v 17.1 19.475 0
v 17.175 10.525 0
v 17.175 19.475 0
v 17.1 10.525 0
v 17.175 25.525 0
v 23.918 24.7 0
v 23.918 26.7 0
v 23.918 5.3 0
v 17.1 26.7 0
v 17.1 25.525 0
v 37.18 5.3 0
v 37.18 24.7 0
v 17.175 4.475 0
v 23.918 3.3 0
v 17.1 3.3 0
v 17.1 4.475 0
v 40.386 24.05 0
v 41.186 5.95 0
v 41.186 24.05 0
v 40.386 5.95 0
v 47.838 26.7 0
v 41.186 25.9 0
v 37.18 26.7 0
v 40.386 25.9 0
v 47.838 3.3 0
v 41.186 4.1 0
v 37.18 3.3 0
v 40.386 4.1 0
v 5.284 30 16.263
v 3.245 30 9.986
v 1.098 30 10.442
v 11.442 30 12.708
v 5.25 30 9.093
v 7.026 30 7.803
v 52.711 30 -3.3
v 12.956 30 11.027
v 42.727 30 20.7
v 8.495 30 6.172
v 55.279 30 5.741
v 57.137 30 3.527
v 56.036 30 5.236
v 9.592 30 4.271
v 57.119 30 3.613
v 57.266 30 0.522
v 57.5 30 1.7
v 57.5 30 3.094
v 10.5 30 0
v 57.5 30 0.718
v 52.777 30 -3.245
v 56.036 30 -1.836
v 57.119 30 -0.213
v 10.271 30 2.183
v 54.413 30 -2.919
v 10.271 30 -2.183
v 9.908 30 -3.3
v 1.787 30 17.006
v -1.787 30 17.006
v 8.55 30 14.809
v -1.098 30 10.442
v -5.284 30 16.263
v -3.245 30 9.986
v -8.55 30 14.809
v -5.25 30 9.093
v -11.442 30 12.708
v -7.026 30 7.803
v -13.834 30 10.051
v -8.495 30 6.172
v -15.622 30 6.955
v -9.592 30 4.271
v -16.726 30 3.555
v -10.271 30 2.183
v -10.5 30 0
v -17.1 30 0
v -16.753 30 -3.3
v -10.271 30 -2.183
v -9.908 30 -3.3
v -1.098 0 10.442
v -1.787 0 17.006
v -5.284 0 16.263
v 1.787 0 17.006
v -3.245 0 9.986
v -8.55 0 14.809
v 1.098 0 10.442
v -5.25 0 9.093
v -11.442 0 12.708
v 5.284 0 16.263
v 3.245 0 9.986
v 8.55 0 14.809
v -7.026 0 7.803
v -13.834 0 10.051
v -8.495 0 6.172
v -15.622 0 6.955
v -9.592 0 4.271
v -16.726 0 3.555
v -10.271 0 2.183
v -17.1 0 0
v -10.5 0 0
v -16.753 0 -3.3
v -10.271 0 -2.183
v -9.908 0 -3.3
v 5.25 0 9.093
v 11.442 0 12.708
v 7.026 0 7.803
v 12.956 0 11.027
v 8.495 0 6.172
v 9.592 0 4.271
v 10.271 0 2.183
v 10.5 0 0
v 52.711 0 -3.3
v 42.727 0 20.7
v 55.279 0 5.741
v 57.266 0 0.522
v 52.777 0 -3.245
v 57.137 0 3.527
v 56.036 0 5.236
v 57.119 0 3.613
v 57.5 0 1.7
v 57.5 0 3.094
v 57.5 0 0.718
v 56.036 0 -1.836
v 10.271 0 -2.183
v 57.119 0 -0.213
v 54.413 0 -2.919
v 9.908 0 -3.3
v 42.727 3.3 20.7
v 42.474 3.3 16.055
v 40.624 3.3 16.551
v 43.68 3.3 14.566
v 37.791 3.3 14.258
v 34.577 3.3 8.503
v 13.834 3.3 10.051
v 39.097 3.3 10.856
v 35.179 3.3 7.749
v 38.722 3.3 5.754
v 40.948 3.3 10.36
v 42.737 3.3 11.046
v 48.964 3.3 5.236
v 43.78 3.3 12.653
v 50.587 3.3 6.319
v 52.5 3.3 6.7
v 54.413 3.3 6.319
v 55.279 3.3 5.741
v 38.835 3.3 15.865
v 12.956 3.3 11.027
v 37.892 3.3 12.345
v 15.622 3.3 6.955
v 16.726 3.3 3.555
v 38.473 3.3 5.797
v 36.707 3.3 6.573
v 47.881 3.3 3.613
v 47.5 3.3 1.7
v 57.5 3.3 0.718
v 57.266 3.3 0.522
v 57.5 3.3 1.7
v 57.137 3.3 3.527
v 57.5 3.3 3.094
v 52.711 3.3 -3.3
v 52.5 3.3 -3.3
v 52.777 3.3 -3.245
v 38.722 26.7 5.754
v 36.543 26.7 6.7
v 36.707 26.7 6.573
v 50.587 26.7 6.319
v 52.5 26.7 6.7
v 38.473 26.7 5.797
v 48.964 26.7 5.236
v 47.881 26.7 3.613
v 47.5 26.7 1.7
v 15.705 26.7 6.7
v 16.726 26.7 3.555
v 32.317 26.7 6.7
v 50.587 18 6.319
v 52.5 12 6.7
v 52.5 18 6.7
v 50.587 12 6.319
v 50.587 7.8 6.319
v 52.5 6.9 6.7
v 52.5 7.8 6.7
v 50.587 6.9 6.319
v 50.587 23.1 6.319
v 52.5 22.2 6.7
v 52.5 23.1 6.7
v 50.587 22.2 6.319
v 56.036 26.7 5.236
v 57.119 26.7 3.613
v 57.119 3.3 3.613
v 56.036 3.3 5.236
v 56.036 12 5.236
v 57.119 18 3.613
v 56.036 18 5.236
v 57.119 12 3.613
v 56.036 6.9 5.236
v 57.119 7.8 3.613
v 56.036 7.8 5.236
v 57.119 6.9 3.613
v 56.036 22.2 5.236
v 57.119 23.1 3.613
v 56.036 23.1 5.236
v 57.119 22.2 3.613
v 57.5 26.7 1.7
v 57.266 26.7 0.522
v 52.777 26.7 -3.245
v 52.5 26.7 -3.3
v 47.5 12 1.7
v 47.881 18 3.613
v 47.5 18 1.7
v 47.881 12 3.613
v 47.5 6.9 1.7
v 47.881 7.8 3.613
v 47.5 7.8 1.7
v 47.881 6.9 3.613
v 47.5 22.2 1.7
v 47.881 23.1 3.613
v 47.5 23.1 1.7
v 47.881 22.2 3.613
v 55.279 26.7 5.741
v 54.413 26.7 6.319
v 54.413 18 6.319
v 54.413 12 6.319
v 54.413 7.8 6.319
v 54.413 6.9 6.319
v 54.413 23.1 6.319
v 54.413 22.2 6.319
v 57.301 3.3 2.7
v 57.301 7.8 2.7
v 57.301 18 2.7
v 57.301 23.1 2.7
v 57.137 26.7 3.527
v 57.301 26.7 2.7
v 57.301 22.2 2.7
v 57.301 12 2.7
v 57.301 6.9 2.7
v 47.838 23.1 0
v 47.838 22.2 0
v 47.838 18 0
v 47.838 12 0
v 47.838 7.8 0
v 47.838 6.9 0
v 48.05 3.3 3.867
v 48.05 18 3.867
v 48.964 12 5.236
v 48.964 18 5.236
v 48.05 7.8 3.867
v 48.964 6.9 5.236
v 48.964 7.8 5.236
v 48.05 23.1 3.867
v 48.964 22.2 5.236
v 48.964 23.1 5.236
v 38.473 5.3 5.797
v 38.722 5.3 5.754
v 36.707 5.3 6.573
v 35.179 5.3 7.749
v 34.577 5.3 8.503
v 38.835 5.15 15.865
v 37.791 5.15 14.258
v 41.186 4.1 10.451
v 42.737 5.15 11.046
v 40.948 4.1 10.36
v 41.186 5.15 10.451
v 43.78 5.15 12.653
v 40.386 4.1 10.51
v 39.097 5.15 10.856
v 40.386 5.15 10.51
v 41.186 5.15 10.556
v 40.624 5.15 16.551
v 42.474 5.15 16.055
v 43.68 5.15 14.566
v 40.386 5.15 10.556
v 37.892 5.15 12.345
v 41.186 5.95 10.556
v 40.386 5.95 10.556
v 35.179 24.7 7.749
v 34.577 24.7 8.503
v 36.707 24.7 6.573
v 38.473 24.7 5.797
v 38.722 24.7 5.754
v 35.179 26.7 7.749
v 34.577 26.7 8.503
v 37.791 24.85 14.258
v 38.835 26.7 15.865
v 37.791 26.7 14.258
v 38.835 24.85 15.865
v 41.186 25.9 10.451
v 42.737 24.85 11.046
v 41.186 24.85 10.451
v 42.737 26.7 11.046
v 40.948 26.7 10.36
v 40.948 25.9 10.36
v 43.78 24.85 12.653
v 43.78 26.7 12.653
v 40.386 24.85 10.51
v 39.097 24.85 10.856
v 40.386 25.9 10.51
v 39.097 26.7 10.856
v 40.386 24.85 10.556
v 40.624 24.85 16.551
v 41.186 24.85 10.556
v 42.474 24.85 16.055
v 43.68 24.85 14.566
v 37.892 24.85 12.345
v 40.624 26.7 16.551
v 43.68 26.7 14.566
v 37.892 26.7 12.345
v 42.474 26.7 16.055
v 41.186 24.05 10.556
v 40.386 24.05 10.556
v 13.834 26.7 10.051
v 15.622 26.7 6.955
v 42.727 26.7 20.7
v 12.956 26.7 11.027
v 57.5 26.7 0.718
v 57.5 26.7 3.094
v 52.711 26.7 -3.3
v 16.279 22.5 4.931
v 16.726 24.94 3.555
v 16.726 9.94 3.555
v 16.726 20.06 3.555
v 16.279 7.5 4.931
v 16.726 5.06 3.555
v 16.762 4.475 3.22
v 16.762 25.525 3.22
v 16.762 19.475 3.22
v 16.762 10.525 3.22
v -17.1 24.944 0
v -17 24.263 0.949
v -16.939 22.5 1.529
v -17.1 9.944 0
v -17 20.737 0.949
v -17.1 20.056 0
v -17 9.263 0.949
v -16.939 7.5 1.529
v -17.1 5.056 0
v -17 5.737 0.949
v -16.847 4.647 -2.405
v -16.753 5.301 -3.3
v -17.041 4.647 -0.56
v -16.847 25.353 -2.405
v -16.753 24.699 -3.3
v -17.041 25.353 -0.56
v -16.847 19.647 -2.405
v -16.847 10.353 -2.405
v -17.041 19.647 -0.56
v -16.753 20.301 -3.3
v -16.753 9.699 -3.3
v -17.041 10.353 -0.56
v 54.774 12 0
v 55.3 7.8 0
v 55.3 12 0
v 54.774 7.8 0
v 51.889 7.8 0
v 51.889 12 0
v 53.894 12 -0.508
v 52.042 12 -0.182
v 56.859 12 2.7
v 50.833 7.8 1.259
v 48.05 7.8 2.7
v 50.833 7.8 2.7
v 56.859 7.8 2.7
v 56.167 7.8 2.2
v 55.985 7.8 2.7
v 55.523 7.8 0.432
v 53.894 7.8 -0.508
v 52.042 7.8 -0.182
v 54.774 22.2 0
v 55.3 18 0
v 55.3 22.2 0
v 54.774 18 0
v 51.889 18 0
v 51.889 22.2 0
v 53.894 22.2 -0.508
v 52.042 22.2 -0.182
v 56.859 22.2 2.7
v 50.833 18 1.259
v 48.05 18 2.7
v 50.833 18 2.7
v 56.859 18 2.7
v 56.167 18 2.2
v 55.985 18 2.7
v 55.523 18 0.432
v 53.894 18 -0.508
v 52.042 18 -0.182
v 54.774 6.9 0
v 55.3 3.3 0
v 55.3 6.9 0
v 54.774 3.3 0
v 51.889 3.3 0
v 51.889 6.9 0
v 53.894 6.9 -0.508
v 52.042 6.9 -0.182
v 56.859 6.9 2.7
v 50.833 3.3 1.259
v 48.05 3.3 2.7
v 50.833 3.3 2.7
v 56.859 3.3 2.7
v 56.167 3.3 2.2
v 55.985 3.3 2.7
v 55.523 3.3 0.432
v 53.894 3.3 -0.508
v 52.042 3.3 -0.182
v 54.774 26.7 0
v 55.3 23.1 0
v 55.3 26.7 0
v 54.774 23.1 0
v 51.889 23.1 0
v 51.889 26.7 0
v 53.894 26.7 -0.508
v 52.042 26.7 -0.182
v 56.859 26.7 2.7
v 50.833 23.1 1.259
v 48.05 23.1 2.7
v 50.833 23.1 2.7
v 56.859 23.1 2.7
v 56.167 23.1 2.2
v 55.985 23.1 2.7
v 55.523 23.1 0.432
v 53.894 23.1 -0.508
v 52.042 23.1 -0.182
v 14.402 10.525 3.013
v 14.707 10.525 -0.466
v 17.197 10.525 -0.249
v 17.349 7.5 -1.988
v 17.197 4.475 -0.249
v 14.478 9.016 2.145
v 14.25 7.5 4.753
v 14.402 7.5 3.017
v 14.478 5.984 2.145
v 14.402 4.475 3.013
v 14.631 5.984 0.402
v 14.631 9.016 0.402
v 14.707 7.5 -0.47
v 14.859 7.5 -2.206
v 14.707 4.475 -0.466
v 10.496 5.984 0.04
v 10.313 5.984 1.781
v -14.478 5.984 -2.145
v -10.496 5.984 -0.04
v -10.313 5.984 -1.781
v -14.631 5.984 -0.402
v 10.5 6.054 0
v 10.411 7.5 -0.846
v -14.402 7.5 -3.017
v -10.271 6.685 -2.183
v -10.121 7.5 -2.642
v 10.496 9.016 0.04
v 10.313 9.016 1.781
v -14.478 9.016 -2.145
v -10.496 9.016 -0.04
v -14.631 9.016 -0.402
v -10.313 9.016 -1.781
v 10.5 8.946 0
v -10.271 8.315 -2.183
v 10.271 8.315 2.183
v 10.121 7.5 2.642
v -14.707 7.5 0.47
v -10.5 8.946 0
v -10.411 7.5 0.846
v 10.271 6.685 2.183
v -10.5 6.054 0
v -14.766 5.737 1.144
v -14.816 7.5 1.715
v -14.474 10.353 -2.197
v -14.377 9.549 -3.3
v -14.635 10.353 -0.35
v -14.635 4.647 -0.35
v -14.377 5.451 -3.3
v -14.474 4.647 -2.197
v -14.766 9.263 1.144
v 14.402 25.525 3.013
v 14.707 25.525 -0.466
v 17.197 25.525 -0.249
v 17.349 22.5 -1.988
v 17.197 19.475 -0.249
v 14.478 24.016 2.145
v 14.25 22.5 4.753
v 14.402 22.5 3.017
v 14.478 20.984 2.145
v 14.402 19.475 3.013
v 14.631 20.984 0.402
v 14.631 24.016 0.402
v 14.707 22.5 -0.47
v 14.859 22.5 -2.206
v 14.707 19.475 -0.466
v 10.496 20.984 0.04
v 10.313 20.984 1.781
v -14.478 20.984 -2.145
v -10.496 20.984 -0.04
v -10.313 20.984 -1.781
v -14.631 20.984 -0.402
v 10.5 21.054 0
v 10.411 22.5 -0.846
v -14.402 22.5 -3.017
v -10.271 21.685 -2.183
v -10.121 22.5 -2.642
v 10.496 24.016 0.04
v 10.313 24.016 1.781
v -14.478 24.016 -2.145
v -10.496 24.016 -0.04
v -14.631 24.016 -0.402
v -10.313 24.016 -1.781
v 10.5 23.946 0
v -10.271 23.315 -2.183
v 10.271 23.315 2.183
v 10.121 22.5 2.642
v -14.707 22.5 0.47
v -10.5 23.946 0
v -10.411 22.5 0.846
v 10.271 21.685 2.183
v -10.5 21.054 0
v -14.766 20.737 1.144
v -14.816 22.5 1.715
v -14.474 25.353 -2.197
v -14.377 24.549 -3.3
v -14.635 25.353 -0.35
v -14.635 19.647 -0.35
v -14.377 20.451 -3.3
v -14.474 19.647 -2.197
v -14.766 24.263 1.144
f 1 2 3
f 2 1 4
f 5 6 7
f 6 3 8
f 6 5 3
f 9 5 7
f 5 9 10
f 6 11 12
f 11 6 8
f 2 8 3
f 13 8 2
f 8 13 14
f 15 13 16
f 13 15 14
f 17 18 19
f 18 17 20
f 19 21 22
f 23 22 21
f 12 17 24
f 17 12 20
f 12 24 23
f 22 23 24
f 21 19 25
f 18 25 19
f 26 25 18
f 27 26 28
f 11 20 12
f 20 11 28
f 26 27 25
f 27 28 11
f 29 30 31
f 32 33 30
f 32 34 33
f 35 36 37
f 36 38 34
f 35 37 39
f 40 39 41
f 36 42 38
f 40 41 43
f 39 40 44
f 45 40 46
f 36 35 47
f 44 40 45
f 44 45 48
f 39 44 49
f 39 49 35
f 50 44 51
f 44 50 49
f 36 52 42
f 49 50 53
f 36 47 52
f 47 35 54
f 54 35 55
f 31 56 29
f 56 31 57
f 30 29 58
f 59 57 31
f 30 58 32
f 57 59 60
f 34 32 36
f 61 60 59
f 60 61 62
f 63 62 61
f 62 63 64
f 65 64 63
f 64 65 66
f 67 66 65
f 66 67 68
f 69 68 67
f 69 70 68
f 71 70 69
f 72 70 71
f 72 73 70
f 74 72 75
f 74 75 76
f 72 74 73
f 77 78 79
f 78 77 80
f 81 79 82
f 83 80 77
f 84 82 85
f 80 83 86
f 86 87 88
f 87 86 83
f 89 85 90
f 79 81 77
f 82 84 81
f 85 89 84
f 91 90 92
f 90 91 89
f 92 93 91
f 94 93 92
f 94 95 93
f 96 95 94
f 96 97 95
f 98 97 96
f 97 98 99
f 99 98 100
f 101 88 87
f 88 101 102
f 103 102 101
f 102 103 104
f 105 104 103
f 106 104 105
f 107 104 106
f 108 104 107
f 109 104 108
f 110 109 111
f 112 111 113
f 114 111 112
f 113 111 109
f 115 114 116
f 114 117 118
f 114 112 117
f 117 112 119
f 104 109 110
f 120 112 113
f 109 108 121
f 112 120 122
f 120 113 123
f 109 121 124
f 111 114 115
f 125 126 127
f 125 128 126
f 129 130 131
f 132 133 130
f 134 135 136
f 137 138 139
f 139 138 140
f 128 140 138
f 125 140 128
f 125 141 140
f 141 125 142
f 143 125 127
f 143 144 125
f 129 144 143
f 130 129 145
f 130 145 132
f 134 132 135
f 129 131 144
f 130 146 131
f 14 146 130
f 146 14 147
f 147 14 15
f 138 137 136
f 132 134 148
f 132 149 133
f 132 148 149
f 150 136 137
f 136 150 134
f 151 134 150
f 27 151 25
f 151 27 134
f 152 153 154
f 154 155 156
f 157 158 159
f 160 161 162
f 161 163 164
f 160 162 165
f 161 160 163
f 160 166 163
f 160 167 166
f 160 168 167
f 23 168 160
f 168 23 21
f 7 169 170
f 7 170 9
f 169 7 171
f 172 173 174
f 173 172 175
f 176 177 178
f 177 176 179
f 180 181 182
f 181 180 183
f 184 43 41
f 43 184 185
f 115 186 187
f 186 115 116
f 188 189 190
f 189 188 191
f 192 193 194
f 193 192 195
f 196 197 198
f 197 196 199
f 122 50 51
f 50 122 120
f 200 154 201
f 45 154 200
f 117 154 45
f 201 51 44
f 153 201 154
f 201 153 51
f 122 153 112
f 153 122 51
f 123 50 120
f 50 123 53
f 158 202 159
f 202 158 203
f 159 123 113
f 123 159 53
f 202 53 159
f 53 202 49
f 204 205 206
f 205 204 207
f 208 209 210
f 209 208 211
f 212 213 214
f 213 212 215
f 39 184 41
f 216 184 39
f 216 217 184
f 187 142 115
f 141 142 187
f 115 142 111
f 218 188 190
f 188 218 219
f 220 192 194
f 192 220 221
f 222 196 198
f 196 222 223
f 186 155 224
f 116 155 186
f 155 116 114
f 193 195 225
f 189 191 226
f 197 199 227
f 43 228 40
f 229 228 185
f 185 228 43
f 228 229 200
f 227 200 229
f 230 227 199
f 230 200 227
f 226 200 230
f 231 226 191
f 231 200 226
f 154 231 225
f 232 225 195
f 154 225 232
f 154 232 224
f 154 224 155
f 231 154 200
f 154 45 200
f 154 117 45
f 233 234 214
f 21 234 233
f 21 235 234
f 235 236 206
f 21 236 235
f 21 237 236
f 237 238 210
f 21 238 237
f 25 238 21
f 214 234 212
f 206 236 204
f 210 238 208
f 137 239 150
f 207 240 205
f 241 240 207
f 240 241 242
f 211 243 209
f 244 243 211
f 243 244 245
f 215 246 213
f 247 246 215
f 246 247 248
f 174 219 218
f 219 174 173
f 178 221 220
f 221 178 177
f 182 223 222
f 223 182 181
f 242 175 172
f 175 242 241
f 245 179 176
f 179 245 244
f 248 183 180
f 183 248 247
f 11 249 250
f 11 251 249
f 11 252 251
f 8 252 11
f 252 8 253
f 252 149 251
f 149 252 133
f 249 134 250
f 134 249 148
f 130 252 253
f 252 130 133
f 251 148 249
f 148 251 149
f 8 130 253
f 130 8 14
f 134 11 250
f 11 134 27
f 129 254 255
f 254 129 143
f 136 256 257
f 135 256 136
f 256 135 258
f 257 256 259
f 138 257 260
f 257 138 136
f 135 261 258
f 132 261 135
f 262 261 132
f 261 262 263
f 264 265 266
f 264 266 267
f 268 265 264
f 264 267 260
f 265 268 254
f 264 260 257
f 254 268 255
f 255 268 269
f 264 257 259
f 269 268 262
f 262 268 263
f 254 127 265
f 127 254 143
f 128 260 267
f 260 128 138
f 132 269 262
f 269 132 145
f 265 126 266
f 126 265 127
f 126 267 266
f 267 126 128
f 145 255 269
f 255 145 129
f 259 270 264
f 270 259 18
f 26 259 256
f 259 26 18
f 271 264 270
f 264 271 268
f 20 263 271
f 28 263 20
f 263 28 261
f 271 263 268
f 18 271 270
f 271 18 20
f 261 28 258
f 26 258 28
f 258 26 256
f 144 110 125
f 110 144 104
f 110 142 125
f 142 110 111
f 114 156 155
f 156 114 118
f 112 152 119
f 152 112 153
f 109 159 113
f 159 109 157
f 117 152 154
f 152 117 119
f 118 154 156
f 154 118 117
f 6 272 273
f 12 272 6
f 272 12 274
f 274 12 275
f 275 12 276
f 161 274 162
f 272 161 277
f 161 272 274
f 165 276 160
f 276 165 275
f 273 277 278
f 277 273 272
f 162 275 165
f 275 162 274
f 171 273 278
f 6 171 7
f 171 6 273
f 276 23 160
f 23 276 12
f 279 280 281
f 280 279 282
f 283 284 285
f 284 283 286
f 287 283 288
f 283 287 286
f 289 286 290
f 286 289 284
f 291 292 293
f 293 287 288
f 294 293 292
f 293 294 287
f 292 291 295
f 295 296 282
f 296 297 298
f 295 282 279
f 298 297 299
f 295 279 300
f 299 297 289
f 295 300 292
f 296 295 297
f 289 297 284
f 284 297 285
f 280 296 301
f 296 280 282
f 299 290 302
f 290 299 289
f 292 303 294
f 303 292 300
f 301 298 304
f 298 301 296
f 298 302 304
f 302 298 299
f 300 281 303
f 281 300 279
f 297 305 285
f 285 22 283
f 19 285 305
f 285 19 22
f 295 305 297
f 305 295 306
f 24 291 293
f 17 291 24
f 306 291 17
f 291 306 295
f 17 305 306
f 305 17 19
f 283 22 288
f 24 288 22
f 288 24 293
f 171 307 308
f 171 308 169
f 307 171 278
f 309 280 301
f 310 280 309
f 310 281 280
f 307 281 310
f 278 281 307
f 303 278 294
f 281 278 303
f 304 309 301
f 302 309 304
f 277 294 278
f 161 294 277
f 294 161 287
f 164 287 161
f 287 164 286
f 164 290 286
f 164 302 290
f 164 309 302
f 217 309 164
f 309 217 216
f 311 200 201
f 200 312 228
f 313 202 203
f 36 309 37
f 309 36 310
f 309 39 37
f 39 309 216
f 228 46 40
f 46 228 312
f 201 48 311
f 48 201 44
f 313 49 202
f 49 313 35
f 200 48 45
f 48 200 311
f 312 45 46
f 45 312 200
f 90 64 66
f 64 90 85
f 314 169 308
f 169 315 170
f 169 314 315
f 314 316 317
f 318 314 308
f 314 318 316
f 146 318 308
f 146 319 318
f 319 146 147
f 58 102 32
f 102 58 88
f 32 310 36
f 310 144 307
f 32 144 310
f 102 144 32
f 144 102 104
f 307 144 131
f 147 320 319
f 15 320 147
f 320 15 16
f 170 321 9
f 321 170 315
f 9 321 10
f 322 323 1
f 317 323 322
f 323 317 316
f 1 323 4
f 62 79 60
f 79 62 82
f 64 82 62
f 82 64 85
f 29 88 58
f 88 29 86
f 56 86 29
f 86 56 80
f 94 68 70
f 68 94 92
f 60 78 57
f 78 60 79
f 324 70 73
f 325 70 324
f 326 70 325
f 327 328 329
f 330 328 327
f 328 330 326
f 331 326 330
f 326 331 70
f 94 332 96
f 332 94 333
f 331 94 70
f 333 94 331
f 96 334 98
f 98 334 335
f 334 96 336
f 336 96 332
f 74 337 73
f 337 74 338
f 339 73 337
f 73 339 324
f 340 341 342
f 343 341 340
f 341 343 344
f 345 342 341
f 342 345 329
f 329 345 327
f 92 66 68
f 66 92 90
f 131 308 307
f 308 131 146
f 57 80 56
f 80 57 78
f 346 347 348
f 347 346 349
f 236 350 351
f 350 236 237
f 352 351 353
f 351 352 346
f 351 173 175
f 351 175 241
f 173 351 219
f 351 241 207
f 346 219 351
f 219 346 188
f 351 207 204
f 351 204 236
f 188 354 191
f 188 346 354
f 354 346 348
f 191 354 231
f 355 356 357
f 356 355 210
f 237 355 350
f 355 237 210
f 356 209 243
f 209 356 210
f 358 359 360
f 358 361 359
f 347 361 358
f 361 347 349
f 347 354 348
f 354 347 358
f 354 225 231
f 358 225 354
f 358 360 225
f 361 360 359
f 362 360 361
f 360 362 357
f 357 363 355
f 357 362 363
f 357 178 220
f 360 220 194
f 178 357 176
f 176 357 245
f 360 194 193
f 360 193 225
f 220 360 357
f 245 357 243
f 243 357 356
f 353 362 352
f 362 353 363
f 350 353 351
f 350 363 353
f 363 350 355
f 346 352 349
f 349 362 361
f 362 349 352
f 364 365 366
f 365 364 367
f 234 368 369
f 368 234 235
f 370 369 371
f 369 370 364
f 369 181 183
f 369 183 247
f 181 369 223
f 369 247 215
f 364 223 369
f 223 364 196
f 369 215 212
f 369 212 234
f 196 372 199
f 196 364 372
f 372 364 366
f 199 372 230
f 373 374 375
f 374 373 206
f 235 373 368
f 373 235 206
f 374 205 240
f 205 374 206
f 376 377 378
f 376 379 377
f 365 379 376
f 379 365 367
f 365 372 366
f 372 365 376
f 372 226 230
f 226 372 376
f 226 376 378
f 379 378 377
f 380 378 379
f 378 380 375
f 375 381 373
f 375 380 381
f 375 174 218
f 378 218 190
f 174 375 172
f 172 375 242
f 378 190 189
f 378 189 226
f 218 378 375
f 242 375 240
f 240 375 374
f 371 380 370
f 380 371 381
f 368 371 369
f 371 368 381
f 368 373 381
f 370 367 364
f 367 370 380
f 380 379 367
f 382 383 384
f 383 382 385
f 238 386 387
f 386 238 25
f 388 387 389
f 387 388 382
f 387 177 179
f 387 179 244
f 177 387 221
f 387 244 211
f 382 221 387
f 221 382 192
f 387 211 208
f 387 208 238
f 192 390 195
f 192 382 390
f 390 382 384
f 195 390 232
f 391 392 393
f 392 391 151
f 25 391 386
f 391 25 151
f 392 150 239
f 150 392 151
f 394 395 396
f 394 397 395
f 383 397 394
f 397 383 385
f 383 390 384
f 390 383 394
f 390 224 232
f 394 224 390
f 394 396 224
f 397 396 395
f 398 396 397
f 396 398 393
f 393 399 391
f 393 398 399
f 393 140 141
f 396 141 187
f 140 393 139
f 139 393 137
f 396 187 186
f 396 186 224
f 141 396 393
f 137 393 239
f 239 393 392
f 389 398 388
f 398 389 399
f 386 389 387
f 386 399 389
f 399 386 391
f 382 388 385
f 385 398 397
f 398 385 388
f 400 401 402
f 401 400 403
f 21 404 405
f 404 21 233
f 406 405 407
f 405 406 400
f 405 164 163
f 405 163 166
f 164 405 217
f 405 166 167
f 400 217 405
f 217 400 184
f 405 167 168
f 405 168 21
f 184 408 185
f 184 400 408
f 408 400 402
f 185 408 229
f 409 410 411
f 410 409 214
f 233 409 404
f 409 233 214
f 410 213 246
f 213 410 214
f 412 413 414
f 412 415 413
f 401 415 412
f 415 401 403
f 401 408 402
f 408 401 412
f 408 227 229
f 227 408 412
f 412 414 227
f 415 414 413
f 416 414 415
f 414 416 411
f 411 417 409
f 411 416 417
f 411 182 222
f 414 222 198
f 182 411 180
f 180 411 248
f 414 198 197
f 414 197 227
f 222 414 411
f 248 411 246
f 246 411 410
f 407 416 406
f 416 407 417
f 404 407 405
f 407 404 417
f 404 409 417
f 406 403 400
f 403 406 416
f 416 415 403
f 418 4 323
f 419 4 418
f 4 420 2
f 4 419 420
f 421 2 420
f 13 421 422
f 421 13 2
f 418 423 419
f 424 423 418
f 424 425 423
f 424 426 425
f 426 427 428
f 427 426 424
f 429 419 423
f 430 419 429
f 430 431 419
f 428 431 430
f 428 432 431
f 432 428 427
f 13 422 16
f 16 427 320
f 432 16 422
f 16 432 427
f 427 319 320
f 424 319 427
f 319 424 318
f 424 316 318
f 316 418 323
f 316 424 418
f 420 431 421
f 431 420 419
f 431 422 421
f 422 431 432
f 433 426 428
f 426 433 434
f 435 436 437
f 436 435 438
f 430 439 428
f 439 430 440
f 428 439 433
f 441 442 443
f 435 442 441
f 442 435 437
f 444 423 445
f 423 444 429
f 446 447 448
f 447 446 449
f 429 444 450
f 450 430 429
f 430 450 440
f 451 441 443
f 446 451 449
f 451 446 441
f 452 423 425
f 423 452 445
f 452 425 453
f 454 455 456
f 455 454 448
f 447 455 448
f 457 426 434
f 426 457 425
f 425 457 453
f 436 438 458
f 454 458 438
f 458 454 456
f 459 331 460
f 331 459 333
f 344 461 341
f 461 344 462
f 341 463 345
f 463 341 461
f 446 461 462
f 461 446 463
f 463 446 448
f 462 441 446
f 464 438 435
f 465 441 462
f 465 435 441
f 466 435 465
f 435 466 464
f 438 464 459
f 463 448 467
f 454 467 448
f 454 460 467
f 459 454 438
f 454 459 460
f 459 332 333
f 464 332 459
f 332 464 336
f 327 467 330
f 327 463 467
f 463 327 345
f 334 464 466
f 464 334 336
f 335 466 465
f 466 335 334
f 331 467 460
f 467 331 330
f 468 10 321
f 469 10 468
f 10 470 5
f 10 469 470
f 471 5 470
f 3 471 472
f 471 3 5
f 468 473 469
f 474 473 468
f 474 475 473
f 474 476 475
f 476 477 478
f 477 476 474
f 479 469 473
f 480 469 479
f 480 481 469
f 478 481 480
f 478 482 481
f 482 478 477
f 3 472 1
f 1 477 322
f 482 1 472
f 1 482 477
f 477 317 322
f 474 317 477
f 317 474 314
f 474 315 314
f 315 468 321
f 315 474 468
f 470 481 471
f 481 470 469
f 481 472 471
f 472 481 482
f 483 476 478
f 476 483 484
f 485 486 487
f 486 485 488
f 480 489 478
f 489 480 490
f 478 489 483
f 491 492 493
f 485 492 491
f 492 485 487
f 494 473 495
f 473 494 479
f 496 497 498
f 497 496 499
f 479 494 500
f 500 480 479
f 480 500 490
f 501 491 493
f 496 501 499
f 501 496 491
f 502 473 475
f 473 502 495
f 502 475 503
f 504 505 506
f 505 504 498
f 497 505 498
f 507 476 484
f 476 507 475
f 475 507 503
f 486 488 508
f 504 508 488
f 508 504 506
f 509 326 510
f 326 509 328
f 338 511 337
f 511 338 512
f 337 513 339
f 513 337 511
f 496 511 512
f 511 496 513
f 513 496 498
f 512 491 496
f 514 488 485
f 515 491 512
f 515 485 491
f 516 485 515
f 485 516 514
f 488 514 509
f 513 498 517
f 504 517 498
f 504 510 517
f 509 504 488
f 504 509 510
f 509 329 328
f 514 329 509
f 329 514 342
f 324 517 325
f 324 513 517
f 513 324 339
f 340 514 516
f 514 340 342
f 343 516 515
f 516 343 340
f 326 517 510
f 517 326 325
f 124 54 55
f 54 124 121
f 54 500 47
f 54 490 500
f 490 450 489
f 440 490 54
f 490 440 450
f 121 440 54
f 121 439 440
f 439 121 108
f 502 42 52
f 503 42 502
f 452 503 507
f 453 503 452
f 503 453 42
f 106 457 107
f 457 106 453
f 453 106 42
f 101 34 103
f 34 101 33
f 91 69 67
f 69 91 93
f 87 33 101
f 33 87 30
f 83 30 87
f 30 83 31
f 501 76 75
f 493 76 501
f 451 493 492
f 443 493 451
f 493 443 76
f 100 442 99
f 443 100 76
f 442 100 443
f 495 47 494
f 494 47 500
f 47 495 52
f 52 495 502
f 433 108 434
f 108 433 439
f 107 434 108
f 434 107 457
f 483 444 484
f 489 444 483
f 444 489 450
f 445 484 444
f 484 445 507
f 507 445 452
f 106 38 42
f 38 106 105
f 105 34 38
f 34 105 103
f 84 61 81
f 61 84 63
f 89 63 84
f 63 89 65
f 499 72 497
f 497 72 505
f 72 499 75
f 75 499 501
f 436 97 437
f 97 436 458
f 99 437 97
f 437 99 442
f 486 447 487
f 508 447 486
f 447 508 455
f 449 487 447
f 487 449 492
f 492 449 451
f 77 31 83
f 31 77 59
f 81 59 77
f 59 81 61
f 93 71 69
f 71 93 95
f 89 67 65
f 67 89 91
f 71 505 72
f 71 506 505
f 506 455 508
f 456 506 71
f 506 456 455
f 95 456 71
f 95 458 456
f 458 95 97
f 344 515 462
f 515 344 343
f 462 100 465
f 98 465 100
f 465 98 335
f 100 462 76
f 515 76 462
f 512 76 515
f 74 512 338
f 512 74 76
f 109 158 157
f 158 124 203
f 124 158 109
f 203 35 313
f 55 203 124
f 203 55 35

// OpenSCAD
// file: nuts.scad
e = 0.1; // epsilon

// Screws / Nuts
// described by a K-Element vector, offsets defined as follows
nut_diameter_low   = 0;
nut_diameter_high  = 1;
nut_height         = 2;
screw_channel      = 3;
screw_head_channel = 4;
screw_head_height  = 5;
m3 = [ 5.6,  6.5, 2.5, 3.5,  6.0, 2.5];
m4 = [ 7.0,  8.0, 3.5, 4.5,  7.5, 3.0];
m5 = [ 8.0,  9.2, 3.7, 5.0,  9.2, 3.5];
m6 = [10.0, 11.2, 5.0, 6.0, 10.1, 4.0];

module nut_hole (nut, h)
{
    w = (nut [nut_diameter_low] + nut [nut_diameter_high]) / 2;
    translate ([0, 0, h / 2]) difference () {
        cube ([w, 2*w, h], center = true);
        rotate ([0, 0, 30])
            translate ([0, 1.5 * w, 0])
                cube ([2*w, 2*w, h+e], center = true);
        rotate ([0, 0, -30])
            translate ([0, 1.5 * w, 0])
                cube ([2*w, 2*w, h+e], center = true);
        rotate ([0, 0, 30])
            translate ([0, -1.5 * w, 0])
                cube ([2*w, 2*w, h+e], center = true);
        rotate ([0, 0, -30])
            translate ([0, -1.5 * w, 0])
                cube ([2*w, 2*w, h+e], center = true);
    }
}

// A screw channel + cone for a sunk screw, with h2 it can be deeper
// h is the length of the screw, h2 is how far it is sunk in the cone
// height/width only depends on the given nut.
module countersunk_screw_hole (nut, h, h2 = 0)
{
    cylinder
        ( r1 = (nut [screw_head_channel] * 1.1) / 2
        , r2 = (nut [screw_channel]      * 1.1) / 2
        , h  = nut [screw_head_height]  * 1.05
        );
    cylinder (r = nut [screw_channel] / 2, h = h + nut [screw_head_height]);
    translate ([0, 0, -h2])
        cylinder (r = nut [screw_head_channel] * 1.1 / 2, h = h2);
}
//translate ([5, 0, 0])
//    countersunk_screw_hole (m5, 10, 10, $fa = 6, $fs = .5);

// A channel for a sideways embedded nut
// ehf is the factor for the embedded height for the hole of the nut, we
// make it a little wider than nut-height by default, but it can be
// overridden.
// ewf is the factor for the width of the hole (nut diameter * ewf)
module embedded_nut (nut, h, ehf=1.3, ewf=1)
{
    w = (nut [nut_diameter_low] + nut [nut_diameter_high]) / 2;
    union () {
        translate ([0, -w * ewf * 0.5, 0])
            cube ([nut [nut_height] * ehf, w * ewf, h]);
        rotate ([0, 90, 0]) rotate ([0, 0, 30])
            nut_hole (nut, nut [nut_height] * ehf);
    }
}
//embedded_nut (m3, 20);
// main file
// Refrigerator part
include <nuts.scad>;

module axis (r1, r2, r3, h1, h2, a3, a4, s, m)
{
    sup = 0.8;
    translate ([-sup / 2 + s * sin (a3), m + 0.8, -r3 - r1 - s * cos (a3) + .2])
        cube ([sup, h1 - m, r3]);
    rotate ([-90, 0, 0]) {
        rotate ([0, 0, -a3]) {
            translate ([0, s, 0]) {
                cylinder (r = r1, h = h1);
                difference () {
                    rotate ([0, 0, a4 - 180]) {
                        difference () {
                            cylinder (r = r3, h = h2);
                            translate ([0, 0, -h2])
                                cylinder (r = r2, h = 3 * h2);
                            translate ([r3, 0, 0])
                                cube (2 * r3, center = true);
                        }
                    }
                    translate ([r3, 0, 0])
                        cube (2 * r3, center = true);
                }
            }
        }
    }
}

module side (a1, a2, a3, a4, h1, h2, l, m, r1, r2, r3, s, hk, hs)
{
    rr = h1 / 2;
    hh = h2 - rr;
    w1 = hh / cos (a1);
    w2 = hh / cos (a2);
    bc = l + w2;
    sh = rr - rr * cos (a2);
    translate ([-hh * tan (a2), 0, 0]) {
        difference () {
            translate ([0, 0, hh]) {
                rotate ([0, -a1, 0])
                    translate ([-l, 0, -w1])
                        cube ([l, m, w1]);
                rotate ([0, -a2, 0])
                    translate ([-w2, 0, -w2])
                        cube ([w2, m, w2]);
                axis (r1, r2, r3, m + hk, m + hs, a3, a4, s, m);
            }
            translate ([bc + hh * tan (a2) - sh, 0, 0])
                cube (2 * bc, center = true);
        }
    }
}

module cut (l, w, m, h1, hu)
{
    dm = m * 2 / 3;
    dr = m - dm;
    ru = h1 / 2;
    dy = (w + hu) / 2;
    ri = 0.55 * h1 / 2;
    aa = 60;
    translate ([l - dm, w / 2, ru])
    {
        cube ([2 * ru, hu, 2 * ru], center = true);
        translate ([ru, -hu / 2, -ru])
            rotate ([0, -aa, 0])
                cube ([2 * ru, hu, 2 * ru]);
    }
    translate ([l - dm + ru, dy - hu / 2, 0.6 * h1 + ru - m])
        cube ([2.9 * ru, hu, 2 * ru], center = true);
    translate ([l + ri / 3, dy, dm])
        rotate ([90, 0, 0])
            cylinder (r = ri, h = hu);
}

module screw (r, m)
{
    m3w = m3 [screw_channel] / 2;
    m3h = m3 [screw_head_channel] / 2;
    cylinder (r = m3w, h = 2 * r + 4 * m, center = true);
    translate ([0, 0, -(r + 2 * m + 0.01)])
        cylinder (r = m3h, h = m3 [screw_head_height]);
    translate ([0, 0,  (r + 2 * m - m3 [nut_height] + 0.01)])
        rotate ([0, 0, 90])
            nut_hole (m3, m3 [nut_height]);
}

module fridge
    (l, w, h1, h2, m, r, a1, a2, a3, a4, r1, r2, r3, s, hk, hs, d1, d2)
{
    hm  = (d1 - 2 * d2);
    ha  = (w / 2 - m - d1 / 2 - hm - d2);
    difference () {
        union () {
            translate ([0, 0, -m]) {
                cube ([l, w, m]);
                translate ([0, 0, 0])
                    cube ([l, m, h1]);
                translate ([0, w - m, 0])
                    cube ([l, m, h1]);
                translate ([l, 0, h1 / 2])
                    rotate ([-90, 0, 0])
                        cylinder (r = h1 / 2, h = w);
            }
            translate ([l + h1 - (h1 / 2) * cos (a2), 0, h1 / 2 - m])
                side (a1, a2, a3, a4, h1, h2, l, m, r1, r2, r3, s, hk, hs);
            translate ([l + h1 - (h1 / 2) * cos (a2), w, h1 / 2 - m])
                mirror ([0, 1, 0])
                side (a1, a2, a3, a4, h1, h2, l, m, r1, r2, r3, s, hk, hs);
            rotate ([-90, 0, 0])
                cylinder (r = r + 2 * m, h = w);
        }
        rotate ([-90, 0, 0])
            translate ([0, 0, -w / 2])
                cylinder (r = r, h = 2 * w);
        translate ([0, 0, -2 * l - m])
            cube (4 * l, center = true);
        translate ([0, -(d1 + hm) / 2, 0])
            cut (l, w, m, h1, hm);
        translate ([0,  (d1 + hm) / 2, 0])
            cut (l, w, m, h1, hm);
        translate ([0,  ha / 2 - w / 2 + m, 0])
            cut (l, w, m, h1, ha);
        translate ([0, -ha / 2 + w / 2 - m, 0])
            cut (l, w, m, h1, ha);
        rotate ([0, 85, 0]) {
            translate ([0, w * 1 / 4, 0])
                screw (r, m);
            translate ([0, w * 3 / 4, 0])
                screw (r, m);
        }
    }
}

r2 = 8;
a4 = acos ((5 * 5 - r2 * r2 - r2 * r2) / (-2 * r2 * r2));
hk = 4.05 - 2.2;
hs = 5.5  - 3.5;
r  = 10.5;
h1 = 10;
l  = 68 - r - h1 / 2; // 54

fridge
    (l, 30, h1, 24, 3.3, r, 18, 40, -15, a4, 3.1, r2, 40, 7.5, hk, hs, 6, 0.9);
